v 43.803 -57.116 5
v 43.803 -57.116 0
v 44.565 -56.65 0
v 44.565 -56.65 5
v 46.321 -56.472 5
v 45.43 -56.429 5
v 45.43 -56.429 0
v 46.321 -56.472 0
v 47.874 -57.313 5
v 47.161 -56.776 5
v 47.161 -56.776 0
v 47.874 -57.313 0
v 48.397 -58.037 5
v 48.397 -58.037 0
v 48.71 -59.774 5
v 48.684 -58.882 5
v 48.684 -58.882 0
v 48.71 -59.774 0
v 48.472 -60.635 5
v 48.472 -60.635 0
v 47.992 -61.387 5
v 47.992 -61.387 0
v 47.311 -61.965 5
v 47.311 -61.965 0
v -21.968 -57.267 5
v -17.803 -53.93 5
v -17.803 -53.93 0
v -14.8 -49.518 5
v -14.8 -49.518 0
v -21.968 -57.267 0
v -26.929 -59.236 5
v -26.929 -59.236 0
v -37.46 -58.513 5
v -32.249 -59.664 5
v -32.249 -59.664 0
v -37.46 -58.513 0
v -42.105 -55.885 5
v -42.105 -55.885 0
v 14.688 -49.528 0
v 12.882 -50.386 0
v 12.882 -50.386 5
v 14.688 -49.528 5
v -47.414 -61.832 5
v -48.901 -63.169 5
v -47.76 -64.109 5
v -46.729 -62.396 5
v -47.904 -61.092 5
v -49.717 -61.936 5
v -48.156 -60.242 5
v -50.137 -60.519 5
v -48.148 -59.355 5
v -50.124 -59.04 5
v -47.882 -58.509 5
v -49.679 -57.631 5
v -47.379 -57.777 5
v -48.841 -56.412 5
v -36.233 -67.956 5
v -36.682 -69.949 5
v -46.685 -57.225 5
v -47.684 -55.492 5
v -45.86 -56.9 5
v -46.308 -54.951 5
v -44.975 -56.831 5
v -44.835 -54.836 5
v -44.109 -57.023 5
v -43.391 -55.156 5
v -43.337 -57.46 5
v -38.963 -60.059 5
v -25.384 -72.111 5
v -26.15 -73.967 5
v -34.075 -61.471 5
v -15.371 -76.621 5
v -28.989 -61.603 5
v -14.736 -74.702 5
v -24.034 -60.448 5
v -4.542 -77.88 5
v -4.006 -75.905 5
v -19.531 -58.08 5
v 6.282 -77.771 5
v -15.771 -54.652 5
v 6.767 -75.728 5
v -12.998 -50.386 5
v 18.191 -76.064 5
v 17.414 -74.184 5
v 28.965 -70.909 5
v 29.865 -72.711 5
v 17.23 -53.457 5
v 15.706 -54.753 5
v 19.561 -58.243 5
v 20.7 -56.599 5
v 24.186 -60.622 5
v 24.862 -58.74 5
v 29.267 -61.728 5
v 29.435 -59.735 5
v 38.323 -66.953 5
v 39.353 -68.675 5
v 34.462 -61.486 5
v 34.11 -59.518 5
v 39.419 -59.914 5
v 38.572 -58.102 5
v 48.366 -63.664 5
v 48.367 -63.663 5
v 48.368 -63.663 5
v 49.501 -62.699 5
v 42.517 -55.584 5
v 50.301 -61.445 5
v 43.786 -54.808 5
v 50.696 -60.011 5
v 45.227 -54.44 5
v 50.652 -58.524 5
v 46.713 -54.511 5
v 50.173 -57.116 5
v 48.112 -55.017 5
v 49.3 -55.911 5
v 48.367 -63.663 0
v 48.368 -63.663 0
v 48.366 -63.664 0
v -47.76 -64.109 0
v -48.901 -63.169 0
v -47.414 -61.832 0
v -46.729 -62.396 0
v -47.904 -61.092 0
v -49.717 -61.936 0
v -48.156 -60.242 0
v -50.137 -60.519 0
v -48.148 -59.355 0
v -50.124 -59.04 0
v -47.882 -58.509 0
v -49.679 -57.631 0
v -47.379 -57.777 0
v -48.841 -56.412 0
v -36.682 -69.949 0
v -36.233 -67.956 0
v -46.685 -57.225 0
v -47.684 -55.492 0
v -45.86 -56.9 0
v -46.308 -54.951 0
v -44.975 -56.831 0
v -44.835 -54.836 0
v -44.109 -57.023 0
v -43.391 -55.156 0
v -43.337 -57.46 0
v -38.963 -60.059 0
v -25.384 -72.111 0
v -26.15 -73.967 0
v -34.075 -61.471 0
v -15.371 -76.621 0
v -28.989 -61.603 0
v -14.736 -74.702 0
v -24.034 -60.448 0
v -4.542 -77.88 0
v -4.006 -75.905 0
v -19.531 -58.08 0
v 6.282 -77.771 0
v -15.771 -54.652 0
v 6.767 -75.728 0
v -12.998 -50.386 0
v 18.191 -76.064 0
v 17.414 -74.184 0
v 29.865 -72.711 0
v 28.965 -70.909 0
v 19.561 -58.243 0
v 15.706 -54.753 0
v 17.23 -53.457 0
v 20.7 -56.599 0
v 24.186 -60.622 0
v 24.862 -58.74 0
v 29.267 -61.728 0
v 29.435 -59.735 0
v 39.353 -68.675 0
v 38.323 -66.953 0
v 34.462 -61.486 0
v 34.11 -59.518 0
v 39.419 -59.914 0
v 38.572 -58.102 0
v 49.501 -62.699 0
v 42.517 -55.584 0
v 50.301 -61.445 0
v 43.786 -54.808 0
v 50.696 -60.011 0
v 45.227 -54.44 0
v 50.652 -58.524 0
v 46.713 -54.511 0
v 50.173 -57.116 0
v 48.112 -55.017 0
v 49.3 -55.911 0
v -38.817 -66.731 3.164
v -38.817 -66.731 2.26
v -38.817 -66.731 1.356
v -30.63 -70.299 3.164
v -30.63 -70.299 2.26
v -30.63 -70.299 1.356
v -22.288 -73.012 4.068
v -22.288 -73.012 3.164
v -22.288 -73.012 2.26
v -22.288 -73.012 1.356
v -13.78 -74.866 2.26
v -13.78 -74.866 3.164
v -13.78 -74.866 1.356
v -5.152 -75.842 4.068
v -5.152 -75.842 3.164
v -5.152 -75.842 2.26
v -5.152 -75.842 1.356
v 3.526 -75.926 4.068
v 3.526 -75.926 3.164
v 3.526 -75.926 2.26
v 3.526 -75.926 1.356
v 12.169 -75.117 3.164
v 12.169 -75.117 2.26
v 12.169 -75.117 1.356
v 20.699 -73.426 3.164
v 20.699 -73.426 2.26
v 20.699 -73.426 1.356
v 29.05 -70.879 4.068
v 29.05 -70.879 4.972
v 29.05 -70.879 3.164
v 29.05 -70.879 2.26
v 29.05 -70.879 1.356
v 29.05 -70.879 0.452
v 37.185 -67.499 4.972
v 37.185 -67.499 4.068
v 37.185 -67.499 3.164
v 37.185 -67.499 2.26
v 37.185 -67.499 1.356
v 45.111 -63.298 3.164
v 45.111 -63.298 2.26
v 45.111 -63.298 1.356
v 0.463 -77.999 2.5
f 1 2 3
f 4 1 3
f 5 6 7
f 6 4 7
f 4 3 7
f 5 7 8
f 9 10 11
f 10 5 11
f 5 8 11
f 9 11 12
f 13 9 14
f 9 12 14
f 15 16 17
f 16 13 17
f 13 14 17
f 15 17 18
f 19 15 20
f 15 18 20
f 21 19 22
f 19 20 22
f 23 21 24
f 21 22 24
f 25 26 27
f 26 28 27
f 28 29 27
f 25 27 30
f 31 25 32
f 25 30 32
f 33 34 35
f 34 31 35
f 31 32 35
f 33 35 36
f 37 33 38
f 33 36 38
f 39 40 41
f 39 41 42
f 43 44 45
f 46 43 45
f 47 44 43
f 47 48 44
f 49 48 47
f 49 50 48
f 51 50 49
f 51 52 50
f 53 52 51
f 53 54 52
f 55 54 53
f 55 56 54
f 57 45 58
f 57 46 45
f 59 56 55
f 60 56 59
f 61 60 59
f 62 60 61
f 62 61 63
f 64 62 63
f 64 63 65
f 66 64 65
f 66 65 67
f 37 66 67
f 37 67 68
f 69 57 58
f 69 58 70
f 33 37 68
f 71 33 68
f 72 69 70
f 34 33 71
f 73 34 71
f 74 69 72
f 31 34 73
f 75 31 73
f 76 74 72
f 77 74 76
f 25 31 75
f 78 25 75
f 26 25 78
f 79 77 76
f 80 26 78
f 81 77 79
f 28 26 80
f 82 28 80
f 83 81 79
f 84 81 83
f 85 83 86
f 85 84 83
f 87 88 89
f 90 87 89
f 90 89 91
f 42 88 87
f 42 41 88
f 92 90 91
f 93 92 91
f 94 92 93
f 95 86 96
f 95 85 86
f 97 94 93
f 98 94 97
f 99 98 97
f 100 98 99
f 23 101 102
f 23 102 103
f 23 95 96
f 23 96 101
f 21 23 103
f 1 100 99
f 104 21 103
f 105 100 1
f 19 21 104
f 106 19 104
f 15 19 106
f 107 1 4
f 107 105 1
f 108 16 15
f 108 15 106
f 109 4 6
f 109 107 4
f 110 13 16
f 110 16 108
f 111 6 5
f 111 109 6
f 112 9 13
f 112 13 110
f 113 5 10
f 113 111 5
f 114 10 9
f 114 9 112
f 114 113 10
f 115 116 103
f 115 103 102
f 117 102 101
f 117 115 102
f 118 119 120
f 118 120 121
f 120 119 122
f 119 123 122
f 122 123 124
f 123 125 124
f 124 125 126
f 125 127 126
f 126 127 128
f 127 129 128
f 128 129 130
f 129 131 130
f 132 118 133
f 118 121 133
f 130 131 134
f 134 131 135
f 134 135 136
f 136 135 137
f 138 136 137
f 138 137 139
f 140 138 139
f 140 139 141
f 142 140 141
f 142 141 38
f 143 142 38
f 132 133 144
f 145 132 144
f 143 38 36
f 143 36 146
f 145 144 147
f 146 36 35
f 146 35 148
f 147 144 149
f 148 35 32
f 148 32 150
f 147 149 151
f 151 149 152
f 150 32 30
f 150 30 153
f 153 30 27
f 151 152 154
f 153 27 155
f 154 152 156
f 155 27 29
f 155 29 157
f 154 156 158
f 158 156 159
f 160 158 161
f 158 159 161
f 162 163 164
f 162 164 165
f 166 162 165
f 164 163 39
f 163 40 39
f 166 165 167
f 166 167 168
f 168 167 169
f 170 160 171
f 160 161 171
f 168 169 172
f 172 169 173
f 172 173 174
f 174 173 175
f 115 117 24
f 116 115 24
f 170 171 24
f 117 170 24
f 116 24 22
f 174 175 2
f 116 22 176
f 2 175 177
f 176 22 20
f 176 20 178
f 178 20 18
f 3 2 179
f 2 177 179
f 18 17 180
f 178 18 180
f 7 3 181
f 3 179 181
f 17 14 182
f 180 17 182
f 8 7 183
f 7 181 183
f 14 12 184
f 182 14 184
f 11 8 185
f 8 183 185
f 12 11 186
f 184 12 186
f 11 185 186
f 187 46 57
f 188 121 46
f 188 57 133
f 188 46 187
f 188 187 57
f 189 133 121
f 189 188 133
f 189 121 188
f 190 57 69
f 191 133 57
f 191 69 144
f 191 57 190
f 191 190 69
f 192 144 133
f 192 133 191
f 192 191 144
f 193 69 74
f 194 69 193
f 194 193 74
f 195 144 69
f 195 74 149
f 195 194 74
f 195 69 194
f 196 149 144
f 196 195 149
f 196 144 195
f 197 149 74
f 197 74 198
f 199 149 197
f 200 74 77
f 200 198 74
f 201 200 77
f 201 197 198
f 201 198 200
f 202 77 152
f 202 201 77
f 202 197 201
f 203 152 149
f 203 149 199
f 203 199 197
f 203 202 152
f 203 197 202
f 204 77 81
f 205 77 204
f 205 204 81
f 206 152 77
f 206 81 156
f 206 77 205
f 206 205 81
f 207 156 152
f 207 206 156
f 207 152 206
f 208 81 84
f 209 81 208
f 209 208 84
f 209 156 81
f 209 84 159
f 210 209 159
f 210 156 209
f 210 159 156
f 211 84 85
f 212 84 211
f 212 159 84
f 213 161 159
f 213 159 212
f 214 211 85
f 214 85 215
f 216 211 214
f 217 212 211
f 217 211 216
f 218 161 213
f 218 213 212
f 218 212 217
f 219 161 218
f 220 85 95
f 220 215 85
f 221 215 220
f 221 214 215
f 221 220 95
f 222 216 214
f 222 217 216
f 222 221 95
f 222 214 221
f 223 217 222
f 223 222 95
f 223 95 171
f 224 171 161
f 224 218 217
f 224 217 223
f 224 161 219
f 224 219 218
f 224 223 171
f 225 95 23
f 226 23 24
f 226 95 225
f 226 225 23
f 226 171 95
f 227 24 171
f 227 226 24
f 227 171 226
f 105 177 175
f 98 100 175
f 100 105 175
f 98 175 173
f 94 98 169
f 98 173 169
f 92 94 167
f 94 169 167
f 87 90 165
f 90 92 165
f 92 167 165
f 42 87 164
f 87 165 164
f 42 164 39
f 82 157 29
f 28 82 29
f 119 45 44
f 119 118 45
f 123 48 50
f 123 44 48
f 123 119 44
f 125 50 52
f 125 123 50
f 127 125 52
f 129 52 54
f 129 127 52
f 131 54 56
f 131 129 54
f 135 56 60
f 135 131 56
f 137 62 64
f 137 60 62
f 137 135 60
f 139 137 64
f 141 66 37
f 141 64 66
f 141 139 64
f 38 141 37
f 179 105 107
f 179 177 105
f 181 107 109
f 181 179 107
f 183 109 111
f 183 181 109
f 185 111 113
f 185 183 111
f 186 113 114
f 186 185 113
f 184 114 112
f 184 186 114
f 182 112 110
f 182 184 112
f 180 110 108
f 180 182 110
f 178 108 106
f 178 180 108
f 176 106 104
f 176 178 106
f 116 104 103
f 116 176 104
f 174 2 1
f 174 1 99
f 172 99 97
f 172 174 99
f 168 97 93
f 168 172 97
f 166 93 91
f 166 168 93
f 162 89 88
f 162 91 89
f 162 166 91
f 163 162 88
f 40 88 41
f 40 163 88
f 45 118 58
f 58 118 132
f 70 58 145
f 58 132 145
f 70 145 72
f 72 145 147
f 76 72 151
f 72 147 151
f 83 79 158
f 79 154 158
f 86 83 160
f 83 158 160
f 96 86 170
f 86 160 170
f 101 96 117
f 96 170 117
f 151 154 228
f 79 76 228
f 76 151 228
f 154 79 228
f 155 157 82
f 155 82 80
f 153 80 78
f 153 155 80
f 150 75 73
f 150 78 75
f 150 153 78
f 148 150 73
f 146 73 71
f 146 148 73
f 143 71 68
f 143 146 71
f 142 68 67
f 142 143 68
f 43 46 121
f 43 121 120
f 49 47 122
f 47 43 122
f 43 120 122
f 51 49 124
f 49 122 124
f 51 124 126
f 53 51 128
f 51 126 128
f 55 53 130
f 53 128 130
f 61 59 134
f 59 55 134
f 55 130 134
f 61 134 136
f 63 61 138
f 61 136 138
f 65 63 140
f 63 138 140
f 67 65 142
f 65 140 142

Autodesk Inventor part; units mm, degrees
ref_plane "YZ Plane" through (0, 0, 0) normal (1, 0, 0) x (0, 1, 0)
ref_plane "XZ Plane" through (0, 0, 0) normal (0, 1, 0) x (-1, 0, 0)
ref_plane "XY Plane" through (0, 0, 0) normal (0, 0, 1) x (1, 0, 0)
sketch "スケッチ1" plane through (0, 0, 0) normal (0, 0, 1) x (1, 0, 0)
  spline S0 degree 4 poles (-46.7287, -62.3958) (-46.4075, -62.5897) (-45.9582, -62.8581) (-45.3809, -63.1982) (-44.6755, -63.6062) (-44.164, -63.8983) (-43.6533, -64.1863) (-43.1431, -64.4703) (-42.6335, -64.7504) (-42.1242, -65.0266) (-41.6152, -65.299) (-41.1064, -65.5676) (-40.5978, -65.8326) (-40.0892, -66.0938) (-39.5807, -66.3514) (-39.072, -66.6054) (-38.5633, -66.8559) (-38.0543, -67.1029) (-37.5452, -67.3463) (-37.0357, -67.5863) (-36.526, -67.8228) (-36.0159, -68.0558) (-35.5054, -68.2855) (-34.9944, -68.5118) (-34.483, -68.7346) (-33.9711, -68.9542) (-33.4587, -69.1703) (-32.9457, -69.3831) (-32.4322, -69.5925) (-31.9181, -69.7986) (-31.4034, -70.0014) (-30.8881, -70.2009) (-30.3721, -70.397) (-29.8555, -70.5898) (-29.3383, -70.7793) (-28.8203, -70.9655) (-28.3017, -71.1484) (-27.7825, -71.3279) (-27.2625, -71.5041) (-26.7419, -71.6771) (-26.2205, -71.8467) (-25.6985, -72.0129) (-25.1758, -72.1759) (-24.6524, -72.3355) (-24.1283, -72.4918) (-23.6035, -72.6447) (-23.078, -72.7943) (-22.5519, -72.9406) (-22.0251, -73.0835) (-21.4976, -73.2231) (-20.9695, -73.3593) (-20.4407, -73.4921) (-19.9113, -73.6216) (-19.3812, -73.7477) (-18.8505, -73.8704) (-18.3193, -73.9897) (-17.7874, -74.1057) (-17.2549, -74.2182) (-16.7219, -74.3274) (-16.1883, -74.4332) (-15.6541, -74.5355) (-15.1195, -74.6344) (-14.5843, -74.7299) (-14.0486, -74.822) (-13.5124, -74.9107) (-12.9757, -74.9959) (-12.4386, -75.0776) (-11.901, -75.156) (-11.363, -75.2309) (-10.8247, -75.3023) (-10.2859, -75.3703) (-9.7467, -75.4348) (-9.2072, -75.4958) (-8.6674, -75.5534) (-8.1272, -75.6075) (-7.5868, -75.6581) (-7.046, -75.7053) (-6.5051, -75.749) (-5.9638, -75.7892) (-5.4224, -75.8259) (-4.8807, -75.8591) (-4.3389, -75.8888) (-3.7969, -75.915) (-3.2547, -75.9378) (-2.7125, -75.957) (-2.1701, -75.9728) (-1.6276, -75.985) (-1.0851, -75.9938) (-0.5426, -75.999) (0, -76.0008) (0.5426, -75.999) (1.0851, -75.9938) (1.6276, -75.985) (2.1701, -75.9728) (2.7124, -75.957) (3.2547, -75.9378) (3.7969, -75.915) (4.3388, -75.8888) (4.8807, -75.8591) (5.4223, -75.8259) (5.9638, -75.7892) (6.505, -75.749) (7.046, -75.7053) (7.5867, -75.6582) (8.1271, -75.6075) (8.6672, -75.5534) (9.207, -75.4958) (9.7465, -75.4348) (10.2856, -75.3703) (10.8243, -75.3023) (11.3626, -75.2309) (11.9005, -75.156) (12.4379, -75.0777) (12.9749, -74.9959) (13.5114, -74.9108) (14.0474, -74.8221) (14.5829, -74.7301) (15.1179, -74.6346) (15.6524, -74.5357) (16.1862, -74.4334) (16.7195, -74.3277) (17.2522, -74.2186) (17.7843, -74.1061) (18.3158, -73.9902) (18.8466, -73.871) (19.3768, -73.7483) (19.9062, -73.6223) (20.435, -73.493) (20.9632, -73.3602) (21.4905, -73.2242) (22.0172, -73.0848) (22.5431, -72.9421) (23.0683, -72.796) (23.5927, -72.6466) (24.1163, -72.4939) (24.6392, -72.3379) (25.1612, -72.1786) (25.6825, -72.0161) (26.2029, -71.8502) (26.7225, -71.681) (27.2413, -71.5086) (27.7593, -71.3329) (28.2764, -71.154) (28.7926, -70.9718) (29.308, -70.7863) (29.8225, -70.5976) (30.3362, -70.4057) (30.849, -70.2105) (31.3609, -70.0121) (31.8719, -69.8105) (32.3821, -69.6057) (32.8914, -69.3976) (33.3998, -69.1863) (33.9073, -68.9719) (34.414, -68.7542) (34.9198, -68.5333) (35.4247, -68.3093) (35.9288, -68.082) (36.432, -67.8516) (36.9344, -67.6179) (37.4359, -67.381) (37.9366, -67.141) (38.4364, -66.8977) (38.9355, -66.6513) (39.4337, -66.4016) (39.9312, -66.1488) (40.4279, -65.8927) (40.9238, -65.6334) (41.419, -65.3709) (41.9135, -65.1051) (42.4073, -64.8361) (42.9004, -64.5639) (43.3928, -64.2884) (43.8846, -64.0096) (44.3758, -63.7275) (44.8664, -63.4421) (45.3565, -63.1534) (46.0301, -62.7516) (46.5798, -62.4176) (47.0065, -62.1545) (47.3109, -61.9649) knots 0 0 0 0 0 0.014459 0.020221 0.025968 0.031703 0.037425 0.043135 0.048834 0.054523 0.060202 0.065871 0.071532 0.077184 0.082829 0.088465 0.094095 0.099718 0.105334 0.110945 0.11655 0.122149 0.127744 0.133333 0.138918 0.144499 0.150076 0.155648 0.161217 0.166783 0.172345 0.177904 0.183461 0.189014 0.194565 0.200113 0.205659 0.211203 0.216745 0.222285 0.227822 0.233359 0.238893 0.244426 0.249957 0.255487 0.261016 0.266543 0.272069 0.277594 0.283118 0.288641 0.294163 0.299685 0.305205 0.310725 0.316243 0.321762 0.327279 0.332796 0.338313 0.343828 0.349344 0.354859 0.360373 0.365887 0.371401 0.376914 0.382427 0.38794 0.393452 0.398964 0.404476 0.409988 0.415499 0.421011 0.426522 0.432033 0.437544 0.443054 0.448565 0.454075 0.459586 0.465096 0.470606 0.476117 0.481627 0.487137 0.492647 0.498157 0.503667 0.509177 0.514688 0.520198 0.525708 0.531218 0.536729 0.542239 0.54775 0.553261 0.558771 0.564282 0.569793 0.575304 0.580816 0.586327 0.591839 0.597351 0.602863 0.608375 0.613888 0.6194 0.624913 0.630427 0.63594 0.641454 0.646969 0.652483 0.657998 0.663514 0.66903 0.674546 0.680063 0.68558 0.691098 0.696617 0.702136 0.707656 0.713176 0.718697 0.724219 0.729741 0.735265 0.740789 0.746314 0.75184 0.757367 0.762895 0.768424 0.773955 0.779486 0.785019 0.790553 0.796089 0.801626 0.807165 0.812705 0.818247 0.82379 0.829336 0.834883 0.840433 0.845984 0.851538 0.857094 0.862653 0.868214 0.873778 0.879345 0.884914 0.890487 0.896063 0.901642 0.907224 0.912811 0.918401 0.923995 0.929593 0.935196 0.940803 0.946414 0.952031 0.957653 0.96328 0.968913 0.974552 0.980196 0.985847 1 1 1 1 1
  arc A0 (-43.3371, -57.4602) -> (-46.7287, -62.3958) centre (-45.1853, -59.8233) ccw
  arc A1 (-43.3371, -57.4602) -> (-12.9977, -50.3865) centre (-31.0158, -41.7063) ccw
  arc A2 (12.8817, -50.3865) -> (43.8031, -57.1163) centre (30.9439, -41.7983) ccw
  arc A3 (47.3109, -61.9649) -> (43.8031, -57.1163) centre (45.732, -59.414) ccw
  arc A4 (-42.105, -55.8848) -> (-14.7995, -49.5185) centre (-31.0158, -41.7063) ccw
  arc A5 (-42.105, -55.8848) -> (-47.7601, -64.1093) centre (-45.1853, -59.8233) ccw
  arc A6 (48.3661, -63.6639) -> (42.5172, -55.5845) centre (45.732, -59.414) ccw
  arc A7 (14.6879, -49.5277) -> (42.5172, -55.5845) centre (30.9439, -41.7983) ccw
  line L0 (-12.9977, -50.3865) -> (-14.7995, -49.5185)
  line L1 (12.8817, -50.3865) -> (14.6879, -49.5277)
  spline S1 degree 5 poles (-47.7621, -64.1081) (-39.0585, -69.3622) (-29.7722, -73.6606) (-19.8779, -76.6074) (0.4344, -79.4943) (20.7174, -76.4) (30.5408, -73.3687) (39.7688, -69.0175) (48.3682, -63.6626) knots 0 0 0 0 0 0 0.500897 0.500897 0.500897 1 1 1 1 1 1
  point P0 (0, 0)
  point P1 (0, 0)
  dimension "d0" = 2
extrude "押し出し1" add sketch "スケッチ1" along normal blind 5
properties part number "脚ゴム2" material "ゴム、シリコーン"
